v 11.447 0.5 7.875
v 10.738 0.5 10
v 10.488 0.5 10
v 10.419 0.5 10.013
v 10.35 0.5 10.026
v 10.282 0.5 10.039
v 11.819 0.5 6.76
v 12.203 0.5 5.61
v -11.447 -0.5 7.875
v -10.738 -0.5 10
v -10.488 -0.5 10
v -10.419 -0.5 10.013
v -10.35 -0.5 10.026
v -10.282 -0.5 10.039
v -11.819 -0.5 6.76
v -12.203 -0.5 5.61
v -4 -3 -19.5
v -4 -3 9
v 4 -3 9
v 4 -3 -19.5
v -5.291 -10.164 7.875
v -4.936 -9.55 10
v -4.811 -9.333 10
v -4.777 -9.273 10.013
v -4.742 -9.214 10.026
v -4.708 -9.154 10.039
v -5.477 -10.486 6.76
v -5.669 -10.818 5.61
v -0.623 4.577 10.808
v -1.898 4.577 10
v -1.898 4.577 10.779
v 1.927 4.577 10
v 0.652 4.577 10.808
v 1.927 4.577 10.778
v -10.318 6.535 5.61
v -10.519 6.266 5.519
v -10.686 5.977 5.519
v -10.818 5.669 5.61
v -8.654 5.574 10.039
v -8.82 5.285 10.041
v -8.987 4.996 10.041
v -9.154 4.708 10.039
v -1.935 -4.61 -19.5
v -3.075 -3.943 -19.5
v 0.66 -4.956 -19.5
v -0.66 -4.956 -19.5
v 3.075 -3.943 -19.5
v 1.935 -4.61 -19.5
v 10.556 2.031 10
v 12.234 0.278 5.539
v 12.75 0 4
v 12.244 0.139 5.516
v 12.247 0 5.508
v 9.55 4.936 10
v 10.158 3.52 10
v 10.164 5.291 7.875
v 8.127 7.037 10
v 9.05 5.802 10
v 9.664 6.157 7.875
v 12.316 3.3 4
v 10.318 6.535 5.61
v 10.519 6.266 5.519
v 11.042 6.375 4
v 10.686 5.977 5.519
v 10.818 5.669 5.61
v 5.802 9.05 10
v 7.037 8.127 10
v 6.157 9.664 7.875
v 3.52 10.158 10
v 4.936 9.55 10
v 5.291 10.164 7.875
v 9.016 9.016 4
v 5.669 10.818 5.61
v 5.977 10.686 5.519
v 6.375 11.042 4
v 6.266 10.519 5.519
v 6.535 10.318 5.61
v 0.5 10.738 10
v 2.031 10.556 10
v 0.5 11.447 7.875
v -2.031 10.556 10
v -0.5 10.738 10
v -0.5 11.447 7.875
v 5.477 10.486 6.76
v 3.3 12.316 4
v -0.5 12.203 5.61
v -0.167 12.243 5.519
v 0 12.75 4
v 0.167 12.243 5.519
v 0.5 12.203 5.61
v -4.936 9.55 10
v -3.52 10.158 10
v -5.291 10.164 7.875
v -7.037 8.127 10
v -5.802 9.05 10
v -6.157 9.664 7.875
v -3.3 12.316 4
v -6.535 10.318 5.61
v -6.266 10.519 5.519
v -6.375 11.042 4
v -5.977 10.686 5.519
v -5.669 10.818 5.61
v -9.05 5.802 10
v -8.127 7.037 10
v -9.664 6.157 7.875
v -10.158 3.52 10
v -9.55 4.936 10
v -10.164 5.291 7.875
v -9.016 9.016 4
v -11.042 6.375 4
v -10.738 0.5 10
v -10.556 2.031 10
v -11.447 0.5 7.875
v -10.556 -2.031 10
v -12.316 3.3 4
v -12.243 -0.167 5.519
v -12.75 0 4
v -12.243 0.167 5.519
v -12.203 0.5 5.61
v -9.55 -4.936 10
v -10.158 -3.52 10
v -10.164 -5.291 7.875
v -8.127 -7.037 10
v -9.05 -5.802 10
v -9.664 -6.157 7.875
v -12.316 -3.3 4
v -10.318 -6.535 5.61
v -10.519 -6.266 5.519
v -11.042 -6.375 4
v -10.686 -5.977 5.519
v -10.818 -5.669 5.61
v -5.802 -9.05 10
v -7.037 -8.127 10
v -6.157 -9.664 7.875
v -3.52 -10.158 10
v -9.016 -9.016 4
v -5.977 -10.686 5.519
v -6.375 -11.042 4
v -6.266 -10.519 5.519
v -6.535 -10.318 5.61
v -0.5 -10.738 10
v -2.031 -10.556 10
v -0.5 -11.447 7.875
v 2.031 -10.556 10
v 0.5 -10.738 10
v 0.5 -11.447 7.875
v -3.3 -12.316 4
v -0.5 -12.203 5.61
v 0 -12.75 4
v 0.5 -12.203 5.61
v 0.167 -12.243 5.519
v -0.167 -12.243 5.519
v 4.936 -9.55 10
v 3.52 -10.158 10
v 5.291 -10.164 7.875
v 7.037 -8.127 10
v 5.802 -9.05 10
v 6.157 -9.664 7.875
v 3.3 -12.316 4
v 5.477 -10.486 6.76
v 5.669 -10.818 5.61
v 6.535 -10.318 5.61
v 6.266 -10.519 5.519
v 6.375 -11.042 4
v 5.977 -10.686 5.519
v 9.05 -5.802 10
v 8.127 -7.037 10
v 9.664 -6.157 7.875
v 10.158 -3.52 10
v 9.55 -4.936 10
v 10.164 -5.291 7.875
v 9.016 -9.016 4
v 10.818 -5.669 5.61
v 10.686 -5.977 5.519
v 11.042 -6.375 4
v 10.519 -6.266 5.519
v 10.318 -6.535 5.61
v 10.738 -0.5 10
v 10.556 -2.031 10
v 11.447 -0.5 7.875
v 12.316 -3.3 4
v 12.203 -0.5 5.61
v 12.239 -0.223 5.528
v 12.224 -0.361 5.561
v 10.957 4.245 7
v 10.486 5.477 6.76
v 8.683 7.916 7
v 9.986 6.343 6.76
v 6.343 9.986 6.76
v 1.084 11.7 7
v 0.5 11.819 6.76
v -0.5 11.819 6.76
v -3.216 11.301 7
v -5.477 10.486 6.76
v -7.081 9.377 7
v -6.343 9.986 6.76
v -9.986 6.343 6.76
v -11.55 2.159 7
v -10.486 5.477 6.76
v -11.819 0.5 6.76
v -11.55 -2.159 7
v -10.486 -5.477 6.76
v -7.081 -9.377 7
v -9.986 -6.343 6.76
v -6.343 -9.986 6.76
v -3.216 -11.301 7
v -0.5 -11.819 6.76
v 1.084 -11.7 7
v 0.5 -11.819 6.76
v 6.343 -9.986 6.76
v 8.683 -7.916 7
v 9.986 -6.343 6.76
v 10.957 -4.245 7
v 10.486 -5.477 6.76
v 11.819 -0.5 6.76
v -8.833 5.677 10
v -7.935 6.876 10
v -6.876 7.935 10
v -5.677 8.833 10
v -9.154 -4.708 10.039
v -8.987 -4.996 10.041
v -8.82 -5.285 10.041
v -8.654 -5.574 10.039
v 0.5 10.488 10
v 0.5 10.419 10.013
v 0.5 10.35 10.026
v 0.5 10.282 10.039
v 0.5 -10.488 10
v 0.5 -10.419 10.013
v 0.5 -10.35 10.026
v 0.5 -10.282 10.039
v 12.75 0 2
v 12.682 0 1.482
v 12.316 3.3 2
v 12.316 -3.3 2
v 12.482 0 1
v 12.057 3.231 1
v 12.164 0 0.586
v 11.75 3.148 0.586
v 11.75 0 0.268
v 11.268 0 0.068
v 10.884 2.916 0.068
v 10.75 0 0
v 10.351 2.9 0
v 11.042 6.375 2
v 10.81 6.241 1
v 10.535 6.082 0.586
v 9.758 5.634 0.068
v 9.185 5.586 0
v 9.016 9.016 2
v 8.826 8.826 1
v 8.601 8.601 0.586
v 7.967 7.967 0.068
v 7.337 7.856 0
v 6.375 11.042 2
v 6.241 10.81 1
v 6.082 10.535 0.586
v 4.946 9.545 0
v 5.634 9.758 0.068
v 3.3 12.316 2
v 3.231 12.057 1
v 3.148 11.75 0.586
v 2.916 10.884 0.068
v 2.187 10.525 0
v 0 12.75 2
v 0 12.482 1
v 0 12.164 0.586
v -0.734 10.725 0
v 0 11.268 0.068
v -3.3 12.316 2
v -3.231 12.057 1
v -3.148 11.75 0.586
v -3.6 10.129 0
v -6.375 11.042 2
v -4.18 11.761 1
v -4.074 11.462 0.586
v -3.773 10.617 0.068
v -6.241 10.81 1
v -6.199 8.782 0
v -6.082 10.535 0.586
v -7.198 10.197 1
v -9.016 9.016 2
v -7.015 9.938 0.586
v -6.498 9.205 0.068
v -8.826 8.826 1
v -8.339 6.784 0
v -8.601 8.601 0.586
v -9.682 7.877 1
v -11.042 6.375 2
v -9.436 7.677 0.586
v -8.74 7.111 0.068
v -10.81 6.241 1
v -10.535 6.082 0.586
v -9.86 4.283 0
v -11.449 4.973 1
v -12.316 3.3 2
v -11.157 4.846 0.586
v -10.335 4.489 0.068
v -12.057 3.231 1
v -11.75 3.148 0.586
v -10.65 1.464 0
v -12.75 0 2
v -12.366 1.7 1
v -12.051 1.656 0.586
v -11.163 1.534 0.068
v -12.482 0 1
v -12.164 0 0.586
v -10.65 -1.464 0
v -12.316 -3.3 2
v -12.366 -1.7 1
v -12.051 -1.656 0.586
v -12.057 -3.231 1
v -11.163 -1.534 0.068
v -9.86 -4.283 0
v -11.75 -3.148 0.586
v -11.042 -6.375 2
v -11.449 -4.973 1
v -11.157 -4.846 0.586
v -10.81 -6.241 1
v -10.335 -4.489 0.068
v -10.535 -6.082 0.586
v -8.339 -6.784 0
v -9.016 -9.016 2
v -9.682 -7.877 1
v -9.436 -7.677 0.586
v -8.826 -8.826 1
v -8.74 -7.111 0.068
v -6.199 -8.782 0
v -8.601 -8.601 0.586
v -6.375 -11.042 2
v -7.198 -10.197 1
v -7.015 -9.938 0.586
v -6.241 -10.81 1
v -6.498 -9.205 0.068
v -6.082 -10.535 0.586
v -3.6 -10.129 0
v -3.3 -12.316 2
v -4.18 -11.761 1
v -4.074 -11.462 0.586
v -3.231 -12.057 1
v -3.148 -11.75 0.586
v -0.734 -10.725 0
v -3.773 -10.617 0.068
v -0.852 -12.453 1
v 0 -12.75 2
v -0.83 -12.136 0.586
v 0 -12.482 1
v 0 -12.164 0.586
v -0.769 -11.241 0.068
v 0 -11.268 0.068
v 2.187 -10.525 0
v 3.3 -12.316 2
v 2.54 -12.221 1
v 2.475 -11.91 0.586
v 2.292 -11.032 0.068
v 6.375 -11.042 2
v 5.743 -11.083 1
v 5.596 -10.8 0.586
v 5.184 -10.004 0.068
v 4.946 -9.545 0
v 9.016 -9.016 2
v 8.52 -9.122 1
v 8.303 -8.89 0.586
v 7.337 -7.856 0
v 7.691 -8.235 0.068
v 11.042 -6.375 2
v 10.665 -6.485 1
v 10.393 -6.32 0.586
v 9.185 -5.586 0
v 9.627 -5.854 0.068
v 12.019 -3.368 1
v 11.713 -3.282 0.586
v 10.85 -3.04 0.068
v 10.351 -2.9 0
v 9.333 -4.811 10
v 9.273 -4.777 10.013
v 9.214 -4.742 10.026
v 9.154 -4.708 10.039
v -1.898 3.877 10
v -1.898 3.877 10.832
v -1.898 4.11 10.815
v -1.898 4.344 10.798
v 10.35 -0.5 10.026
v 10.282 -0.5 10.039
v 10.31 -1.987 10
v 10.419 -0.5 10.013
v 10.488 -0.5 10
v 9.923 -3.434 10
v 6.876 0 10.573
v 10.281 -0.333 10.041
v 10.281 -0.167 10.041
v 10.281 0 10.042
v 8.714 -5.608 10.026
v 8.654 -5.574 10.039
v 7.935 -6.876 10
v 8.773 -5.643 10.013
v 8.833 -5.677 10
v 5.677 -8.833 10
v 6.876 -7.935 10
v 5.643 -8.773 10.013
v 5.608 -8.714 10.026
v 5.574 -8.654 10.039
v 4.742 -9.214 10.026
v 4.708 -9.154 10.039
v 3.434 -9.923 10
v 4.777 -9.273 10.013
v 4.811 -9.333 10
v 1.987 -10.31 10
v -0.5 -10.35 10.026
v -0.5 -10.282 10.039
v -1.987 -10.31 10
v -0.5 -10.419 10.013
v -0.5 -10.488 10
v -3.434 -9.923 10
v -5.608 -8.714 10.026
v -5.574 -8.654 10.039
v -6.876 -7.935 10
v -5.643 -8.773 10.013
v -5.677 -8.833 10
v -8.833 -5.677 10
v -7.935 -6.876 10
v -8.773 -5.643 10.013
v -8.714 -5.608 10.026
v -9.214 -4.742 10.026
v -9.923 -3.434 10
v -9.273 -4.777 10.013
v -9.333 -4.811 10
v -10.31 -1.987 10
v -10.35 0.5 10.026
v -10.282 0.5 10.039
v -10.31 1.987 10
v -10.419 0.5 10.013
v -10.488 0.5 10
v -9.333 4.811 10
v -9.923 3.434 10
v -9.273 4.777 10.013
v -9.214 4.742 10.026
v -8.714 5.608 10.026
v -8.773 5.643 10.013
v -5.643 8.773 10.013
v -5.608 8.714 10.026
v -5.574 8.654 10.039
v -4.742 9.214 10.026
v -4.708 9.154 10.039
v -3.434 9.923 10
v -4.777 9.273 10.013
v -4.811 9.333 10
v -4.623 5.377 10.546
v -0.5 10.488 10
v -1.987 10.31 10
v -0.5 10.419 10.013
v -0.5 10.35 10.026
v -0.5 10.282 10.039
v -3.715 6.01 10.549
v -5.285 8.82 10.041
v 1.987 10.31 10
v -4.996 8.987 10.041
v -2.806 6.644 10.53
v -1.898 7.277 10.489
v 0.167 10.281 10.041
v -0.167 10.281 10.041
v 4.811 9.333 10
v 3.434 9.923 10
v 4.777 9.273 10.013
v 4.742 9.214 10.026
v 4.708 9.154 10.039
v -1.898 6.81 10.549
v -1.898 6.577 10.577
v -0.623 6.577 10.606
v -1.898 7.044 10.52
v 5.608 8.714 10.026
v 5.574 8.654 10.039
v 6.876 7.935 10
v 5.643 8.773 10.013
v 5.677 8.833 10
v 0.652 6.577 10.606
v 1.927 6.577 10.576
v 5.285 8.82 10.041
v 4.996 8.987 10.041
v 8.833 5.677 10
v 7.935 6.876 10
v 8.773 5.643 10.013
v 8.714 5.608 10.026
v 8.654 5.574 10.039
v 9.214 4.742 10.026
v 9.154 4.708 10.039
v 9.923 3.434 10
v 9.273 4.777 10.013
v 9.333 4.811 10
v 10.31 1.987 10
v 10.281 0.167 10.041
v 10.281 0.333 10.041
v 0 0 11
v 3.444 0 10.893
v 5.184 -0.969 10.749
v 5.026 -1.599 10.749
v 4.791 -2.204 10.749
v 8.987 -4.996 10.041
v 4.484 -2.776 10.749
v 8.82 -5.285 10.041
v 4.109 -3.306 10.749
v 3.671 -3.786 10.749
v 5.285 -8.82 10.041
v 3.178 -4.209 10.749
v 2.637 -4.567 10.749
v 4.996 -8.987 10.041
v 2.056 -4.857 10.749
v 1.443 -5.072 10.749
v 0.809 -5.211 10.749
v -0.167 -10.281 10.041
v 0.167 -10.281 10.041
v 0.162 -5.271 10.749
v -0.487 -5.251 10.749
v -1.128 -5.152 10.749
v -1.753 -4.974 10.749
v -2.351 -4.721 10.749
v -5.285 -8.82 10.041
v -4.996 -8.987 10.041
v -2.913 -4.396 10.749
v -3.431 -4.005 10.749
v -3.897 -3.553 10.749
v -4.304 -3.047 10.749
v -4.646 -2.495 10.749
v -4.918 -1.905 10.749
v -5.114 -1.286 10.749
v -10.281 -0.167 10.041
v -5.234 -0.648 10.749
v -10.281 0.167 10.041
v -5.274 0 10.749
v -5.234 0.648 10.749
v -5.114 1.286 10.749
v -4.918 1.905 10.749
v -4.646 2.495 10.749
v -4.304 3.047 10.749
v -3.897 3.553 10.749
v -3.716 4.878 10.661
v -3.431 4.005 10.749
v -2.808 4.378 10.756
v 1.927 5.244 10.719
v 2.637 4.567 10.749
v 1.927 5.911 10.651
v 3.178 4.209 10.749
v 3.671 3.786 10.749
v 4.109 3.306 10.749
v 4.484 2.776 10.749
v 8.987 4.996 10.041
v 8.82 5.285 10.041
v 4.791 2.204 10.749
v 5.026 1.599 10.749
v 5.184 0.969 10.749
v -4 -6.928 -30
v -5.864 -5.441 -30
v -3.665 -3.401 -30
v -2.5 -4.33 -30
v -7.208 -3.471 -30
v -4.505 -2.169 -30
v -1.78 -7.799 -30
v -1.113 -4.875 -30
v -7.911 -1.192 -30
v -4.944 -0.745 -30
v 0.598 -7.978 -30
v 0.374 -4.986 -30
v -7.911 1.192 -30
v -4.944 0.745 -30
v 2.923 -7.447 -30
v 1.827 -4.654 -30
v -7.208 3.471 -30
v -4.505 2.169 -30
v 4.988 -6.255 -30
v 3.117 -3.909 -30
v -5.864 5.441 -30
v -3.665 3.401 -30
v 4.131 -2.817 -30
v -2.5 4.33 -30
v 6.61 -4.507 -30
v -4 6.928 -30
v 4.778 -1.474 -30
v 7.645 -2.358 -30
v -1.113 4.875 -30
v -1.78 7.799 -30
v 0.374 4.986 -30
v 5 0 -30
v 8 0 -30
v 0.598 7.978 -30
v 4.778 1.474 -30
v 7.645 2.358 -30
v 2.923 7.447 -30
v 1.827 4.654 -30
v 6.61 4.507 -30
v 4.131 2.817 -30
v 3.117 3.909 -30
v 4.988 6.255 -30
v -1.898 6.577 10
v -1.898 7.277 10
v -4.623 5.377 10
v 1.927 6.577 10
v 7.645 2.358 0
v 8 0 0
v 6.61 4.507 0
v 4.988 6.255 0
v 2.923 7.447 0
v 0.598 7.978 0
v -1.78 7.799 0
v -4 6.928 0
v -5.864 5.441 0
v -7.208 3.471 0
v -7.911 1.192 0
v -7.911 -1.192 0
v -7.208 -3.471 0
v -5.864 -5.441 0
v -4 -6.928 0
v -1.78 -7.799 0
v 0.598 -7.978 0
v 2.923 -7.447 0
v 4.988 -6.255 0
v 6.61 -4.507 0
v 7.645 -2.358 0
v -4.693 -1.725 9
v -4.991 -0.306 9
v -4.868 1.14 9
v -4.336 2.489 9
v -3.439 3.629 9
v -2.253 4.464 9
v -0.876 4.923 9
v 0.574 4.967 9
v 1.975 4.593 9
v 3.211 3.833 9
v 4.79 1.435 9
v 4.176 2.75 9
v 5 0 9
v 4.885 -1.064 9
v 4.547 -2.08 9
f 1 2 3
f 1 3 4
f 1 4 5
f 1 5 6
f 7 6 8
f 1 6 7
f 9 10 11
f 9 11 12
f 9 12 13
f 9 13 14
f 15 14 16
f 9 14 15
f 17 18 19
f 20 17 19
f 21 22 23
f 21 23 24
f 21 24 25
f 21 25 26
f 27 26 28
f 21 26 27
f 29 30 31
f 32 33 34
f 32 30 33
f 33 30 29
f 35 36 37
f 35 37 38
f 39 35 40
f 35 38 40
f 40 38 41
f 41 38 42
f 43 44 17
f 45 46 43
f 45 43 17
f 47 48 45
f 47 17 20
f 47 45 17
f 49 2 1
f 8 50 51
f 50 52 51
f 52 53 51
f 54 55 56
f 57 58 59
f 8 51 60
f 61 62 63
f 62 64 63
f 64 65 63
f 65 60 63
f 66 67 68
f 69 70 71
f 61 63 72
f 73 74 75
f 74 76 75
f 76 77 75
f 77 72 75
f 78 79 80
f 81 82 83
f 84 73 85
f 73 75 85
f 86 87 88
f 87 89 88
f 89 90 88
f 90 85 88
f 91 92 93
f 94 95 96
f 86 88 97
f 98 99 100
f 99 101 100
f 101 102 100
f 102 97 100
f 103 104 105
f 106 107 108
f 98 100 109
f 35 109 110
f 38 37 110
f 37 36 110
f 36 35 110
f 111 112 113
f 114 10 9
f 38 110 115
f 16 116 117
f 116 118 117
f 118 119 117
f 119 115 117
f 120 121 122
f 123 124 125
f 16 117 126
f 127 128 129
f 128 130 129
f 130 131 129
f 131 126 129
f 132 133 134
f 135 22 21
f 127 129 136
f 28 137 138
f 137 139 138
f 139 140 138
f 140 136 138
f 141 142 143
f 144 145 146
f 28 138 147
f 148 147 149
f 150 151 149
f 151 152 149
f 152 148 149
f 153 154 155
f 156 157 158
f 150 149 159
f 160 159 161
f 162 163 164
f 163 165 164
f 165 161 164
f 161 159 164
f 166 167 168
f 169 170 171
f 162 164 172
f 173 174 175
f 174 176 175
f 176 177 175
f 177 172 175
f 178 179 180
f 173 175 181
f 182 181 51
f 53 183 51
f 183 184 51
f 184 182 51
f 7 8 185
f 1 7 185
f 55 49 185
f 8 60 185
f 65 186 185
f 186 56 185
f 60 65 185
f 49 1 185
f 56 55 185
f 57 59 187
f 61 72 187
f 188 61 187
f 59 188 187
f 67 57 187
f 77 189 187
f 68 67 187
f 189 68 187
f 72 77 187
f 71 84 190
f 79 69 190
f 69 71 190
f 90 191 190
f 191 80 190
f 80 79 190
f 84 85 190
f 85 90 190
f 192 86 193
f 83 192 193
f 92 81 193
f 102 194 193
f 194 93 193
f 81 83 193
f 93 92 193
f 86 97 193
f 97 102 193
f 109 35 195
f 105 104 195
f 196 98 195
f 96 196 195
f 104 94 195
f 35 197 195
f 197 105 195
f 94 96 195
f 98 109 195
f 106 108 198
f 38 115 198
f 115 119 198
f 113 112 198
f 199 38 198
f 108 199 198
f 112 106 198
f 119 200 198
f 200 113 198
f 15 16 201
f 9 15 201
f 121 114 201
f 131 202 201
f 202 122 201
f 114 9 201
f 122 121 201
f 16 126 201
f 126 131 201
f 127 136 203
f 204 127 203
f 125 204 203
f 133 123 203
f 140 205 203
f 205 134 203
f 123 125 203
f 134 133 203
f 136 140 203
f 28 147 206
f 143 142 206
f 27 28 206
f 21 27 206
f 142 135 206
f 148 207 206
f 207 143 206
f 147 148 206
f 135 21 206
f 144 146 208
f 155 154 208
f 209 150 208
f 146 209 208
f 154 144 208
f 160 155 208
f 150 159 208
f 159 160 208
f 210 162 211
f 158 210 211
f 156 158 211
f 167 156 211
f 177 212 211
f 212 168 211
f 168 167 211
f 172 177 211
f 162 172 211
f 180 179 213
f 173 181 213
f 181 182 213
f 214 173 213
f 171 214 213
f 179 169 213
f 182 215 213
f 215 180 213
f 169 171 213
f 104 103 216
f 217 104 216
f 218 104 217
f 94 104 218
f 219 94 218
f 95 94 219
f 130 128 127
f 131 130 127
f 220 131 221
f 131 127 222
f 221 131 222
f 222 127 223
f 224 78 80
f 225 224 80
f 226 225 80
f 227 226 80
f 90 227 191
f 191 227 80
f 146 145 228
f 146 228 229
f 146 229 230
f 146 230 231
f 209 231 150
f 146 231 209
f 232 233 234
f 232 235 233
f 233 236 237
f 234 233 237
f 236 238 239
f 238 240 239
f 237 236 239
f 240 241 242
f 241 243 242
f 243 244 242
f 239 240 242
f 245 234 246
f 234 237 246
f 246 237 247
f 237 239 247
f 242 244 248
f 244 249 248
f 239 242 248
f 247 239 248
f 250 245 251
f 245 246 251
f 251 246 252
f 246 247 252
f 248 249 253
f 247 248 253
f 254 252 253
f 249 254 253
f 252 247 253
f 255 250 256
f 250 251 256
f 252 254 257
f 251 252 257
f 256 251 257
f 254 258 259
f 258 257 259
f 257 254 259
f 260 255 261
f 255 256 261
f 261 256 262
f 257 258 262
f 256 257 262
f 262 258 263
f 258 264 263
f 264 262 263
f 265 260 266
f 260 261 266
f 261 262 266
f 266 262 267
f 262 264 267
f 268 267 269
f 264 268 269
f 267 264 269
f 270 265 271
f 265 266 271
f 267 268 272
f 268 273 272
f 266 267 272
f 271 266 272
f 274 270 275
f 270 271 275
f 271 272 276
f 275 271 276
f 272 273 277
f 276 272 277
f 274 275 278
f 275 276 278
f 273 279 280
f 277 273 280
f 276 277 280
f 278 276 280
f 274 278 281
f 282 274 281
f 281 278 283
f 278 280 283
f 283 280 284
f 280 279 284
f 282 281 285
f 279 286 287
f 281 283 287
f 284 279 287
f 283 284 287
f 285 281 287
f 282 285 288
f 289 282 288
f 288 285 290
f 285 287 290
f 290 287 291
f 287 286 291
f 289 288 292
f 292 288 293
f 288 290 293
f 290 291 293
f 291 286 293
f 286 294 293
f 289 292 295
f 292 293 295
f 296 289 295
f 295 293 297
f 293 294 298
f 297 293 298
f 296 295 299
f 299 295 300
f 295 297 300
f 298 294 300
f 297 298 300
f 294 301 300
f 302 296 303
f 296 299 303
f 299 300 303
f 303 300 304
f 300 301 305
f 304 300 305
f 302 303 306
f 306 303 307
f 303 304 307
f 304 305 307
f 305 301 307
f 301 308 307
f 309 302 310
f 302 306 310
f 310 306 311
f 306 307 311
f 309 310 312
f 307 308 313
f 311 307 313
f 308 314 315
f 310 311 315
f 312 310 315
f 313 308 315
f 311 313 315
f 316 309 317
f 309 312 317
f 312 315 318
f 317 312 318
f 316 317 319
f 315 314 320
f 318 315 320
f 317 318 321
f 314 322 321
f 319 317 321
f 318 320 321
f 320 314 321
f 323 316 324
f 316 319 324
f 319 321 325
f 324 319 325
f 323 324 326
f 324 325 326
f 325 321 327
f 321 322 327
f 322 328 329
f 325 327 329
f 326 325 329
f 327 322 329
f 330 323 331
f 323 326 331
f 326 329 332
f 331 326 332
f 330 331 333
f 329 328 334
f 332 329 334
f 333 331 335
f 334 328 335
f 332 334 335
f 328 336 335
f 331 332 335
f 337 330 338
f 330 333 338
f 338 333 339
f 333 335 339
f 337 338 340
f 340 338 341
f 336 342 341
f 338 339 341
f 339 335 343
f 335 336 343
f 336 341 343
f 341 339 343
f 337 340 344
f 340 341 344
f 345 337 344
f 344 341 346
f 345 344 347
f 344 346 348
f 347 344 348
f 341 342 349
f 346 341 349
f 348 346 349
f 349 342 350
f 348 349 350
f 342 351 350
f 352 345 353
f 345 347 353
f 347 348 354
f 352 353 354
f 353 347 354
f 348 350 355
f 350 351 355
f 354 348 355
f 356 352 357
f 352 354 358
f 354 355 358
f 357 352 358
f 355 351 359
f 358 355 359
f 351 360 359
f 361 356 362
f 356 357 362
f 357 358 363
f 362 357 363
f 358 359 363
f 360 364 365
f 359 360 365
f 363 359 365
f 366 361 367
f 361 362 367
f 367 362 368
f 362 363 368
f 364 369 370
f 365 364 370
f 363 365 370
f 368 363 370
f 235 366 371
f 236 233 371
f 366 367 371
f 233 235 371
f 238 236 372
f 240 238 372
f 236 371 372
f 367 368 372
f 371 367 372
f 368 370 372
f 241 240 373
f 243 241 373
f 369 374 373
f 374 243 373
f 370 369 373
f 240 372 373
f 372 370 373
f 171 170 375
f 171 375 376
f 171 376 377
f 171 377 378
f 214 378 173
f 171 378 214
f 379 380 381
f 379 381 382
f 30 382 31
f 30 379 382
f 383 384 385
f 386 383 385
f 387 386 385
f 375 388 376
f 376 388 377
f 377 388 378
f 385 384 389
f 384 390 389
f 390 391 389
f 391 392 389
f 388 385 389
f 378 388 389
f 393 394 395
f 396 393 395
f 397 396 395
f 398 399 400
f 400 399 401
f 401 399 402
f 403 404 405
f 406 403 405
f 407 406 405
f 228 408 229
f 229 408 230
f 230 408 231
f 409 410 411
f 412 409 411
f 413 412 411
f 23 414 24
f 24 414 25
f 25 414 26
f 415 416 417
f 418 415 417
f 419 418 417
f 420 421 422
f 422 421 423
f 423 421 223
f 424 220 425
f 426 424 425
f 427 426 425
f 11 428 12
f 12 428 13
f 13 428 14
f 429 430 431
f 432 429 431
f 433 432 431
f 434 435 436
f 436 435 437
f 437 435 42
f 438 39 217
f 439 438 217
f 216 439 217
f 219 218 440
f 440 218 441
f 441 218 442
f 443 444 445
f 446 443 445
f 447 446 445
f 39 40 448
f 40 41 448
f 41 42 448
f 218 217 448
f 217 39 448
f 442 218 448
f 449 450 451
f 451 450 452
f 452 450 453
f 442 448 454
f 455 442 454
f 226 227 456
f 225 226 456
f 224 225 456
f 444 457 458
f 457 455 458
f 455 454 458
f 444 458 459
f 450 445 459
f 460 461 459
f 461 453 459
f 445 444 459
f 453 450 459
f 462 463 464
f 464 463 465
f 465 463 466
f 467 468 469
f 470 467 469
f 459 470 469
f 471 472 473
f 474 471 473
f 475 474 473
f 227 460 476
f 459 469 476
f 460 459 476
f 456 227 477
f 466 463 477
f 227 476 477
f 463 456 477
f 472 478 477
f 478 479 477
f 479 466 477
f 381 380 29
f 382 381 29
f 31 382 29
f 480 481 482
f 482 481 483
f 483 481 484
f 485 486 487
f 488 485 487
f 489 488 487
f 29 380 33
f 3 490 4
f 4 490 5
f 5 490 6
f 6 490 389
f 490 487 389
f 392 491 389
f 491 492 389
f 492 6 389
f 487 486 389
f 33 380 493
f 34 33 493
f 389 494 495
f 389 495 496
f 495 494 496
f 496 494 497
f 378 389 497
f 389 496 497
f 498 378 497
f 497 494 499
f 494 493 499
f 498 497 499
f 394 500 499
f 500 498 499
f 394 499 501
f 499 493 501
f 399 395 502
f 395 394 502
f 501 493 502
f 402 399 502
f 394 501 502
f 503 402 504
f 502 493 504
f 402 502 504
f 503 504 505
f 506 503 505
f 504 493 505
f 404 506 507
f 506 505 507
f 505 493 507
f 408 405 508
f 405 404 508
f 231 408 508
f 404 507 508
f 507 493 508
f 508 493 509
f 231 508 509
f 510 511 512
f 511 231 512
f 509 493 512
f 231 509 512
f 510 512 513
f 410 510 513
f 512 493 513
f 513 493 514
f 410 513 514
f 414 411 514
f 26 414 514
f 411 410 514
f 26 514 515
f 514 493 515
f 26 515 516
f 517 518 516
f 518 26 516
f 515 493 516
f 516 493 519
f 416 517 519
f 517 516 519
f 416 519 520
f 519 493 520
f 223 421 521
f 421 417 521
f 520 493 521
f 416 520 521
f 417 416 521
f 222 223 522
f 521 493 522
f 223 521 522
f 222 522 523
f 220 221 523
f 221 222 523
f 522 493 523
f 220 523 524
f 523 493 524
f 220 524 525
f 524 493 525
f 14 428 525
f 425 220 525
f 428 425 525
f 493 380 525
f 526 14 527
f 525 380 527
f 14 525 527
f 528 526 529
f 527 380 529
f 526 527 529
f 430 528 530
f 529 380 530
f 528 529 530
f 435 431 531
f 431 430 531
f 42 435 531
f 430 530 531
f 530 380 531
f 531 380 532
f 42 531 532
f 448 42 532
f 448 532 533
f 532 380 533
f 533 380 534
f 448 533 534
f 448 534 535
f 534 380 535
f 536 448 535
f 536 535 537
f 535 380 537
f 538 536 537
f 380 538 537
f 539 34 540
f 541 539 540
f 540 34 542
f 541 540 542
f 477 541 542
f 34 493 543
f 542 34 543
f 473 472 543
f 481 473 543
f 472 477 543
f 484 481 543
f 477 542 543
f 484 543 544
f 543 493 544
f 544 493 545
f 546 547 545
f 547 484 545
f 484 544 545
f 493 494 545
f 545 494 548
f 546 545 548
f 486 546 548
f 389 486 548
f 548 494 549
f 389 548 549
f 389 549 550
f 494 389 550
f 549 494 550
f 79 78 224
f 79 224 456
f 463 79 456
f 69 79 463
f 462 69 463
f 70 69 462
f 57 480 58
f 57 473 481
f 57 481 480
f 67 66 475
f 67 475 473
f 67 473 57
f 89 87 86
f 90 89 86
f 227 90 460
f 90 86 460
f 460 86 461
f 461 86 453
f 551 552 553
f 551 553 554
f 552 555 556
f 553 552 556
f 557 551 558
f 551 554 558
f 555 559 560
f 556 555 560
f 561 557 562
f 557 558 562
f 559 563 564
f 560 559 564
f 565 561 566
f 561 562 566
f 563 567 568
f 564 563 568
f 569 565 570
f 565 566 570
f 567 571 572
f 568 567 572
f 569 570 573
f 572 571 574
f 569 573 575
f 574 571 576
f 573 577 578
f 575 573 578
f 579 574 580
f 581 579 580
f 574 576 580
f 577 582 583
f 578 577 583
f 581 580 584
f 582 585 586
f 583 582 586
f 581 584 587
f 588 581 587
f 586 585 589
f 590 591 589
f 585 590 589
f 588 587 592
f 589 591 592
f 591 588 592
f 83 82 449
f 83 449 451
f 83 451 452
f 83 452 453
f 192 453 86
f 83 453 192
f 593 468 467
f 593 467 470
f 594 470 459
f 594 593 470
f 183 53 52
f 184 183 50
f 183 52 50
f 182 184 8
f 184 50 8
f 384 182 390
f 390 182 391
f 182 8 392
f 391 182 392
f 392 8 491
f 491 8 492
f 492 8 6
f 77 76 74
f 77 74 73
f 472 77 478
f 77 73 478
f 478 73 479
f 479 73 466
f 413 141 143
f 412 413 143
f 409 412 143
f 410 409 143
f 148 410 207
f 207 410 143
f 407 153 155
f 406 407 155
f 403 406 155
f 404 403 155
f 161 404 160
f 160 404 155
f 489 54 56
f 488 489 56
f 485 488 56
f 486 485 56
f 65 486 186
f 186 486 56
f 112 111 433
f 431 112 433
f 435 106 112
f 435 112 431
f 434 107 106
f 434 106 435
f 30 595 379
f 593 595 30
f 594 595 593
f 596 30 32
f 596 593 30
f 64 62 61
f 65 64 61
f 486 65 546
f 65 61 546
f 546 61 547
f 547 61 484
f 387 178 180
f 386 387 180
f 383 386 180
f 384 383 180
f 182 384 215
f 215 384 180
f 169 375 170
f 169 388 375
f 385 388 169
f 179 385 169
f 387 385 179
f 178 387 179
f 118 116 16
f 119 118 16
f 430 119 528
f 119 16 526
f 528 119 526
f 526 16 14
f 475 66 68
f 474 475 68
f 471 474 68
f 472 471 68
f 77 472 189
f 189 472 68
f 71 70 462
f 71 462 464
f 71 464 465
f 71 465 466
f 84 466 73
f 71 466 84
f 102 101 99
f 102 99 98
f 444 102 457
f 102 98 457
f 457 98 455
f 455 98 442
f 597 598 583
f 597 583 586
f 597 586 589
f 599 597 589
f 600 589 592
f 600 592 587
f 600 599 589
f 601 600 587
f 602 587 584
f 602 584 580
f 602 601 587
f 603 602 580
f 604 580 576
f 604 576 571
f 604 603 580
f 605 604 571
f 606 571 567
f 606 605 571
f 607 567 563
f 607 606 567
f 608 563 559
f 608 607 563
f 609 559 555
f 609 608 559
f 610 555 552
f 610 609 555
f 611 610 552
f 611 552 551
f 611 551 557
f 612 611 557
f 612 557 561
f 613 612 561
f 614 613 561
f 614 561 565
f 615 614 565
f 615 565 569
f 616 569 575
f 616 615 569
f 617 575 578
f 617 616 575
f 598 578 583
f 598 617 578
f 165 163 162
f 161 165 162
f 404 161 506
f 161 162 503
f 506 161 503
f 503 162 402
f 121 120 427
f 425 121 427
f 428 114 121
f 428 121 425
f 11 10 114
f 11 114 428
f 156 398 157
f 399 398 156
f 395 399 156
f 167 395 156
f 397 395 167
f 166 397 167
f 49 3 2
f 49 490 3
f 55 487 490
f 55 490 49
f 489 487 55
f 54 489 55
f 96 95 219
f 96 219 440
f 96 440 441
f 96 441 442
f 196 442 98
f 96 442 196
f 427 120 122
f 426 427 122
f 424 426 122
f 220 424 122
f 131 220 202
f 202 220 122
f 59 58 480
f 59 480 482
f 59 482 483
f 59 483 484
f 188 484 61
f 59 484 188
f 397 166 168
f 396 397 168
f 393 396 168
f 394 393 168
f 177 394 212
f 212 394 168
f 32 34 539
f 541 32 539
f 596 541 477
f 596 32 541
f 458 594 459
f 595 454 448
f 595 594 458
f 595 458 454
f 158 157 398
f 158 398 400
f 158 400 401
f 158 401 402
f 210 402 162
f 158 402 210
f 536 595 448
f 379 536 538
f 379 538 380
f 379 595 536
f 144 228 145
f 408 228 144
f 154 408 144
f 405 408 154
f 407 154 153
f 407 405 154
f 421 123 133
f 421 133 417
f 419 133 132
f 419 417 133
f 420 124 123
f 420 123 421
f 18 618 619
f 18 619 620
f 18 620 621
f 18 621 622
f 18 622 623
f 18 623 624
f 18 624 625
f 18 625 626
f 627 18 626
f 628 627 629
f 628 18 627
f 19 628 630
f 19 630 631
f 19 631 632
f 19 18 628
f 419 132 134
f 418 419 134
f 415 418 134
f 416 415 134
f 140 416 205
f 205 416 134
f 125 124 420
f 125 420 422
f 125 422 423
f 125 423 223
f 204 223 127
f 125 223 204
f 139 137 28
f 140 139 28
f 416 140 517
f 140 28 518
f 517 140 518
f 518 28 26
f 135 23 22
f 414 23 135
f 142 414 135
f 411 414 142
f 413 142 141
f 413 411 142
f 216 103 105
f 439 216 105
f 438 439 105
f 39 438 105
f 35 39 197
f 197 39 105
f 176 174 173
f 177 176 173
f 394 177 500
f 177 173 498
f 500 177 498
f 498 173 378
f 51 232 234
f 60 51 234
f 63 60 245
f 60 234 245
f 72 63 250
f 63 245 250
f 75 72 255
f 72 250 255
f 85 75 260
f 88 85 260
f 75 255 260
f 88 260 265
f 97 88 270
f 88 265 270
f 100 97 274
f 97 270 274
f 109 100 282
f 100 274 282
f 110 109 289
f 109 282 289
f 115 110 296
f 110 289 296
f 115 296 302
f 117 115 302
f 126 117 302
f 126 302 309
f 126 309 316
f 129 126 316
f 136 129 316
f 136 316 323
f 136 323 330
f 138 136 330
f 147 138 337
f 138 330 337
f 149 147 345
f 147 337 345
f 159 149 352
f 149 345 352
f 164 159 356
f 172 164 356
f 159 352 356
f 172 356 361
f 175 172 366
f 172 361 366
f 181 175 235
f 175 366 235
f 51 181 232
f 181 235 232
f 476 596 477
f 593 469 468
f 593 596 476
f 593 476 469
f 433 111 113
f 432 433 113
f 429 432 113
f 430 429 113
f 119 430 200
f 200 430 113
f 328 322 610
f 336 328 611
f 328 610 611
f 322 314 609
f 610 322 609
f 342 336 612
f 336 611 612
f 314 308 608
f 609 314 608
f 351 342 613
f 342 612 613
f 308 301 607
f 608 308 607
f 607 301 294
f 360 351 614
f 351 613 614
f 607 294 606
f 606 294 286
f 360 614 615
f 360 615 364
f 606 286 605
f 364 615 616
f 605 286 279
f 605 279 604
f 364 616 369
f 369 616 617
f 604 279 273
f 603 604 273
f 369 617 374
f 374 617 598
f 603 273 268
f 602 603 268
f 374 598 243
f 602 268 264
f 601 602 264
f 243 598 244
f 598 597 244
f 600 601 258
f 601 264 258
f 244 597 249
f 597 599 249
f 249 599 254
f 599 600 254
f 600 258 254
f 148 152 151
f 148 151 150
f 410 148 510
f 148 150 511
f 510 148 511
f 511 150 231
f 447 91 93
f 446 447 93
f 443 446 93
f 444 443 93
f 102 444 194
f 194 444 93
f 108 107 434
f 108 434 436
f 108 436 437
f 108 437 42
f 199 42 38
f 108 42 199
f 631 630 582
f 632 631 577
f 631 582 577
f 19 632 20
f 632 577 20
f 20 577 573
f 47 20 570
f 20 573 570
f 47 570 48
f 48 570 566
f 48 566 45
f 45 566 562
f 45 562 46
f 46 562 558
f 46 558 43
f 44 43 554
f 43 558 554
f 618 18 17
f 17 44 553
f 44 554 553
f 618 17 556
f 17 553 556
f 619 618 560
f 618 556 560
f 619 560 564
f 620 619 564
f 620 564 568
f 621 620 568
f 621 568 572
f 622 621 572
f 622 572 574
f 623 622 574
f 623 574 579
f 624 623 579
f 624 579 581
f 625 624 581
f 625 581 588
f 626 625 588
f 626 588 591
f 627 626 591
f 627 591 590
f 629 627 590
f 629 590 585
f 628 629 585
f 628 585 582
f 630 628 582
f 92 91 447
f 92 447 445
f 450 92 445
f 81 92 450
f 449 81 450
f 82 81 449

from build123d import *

# Parameters (mm, degrees)
F0_R             = 8
F1_DEPTH         = 30
F2_R             = 12.75
F3_DEPTH         = 10
F4_SIZE2         = 6
F4_SIZE          = 2
F7_R             = 2
F8_R             = 5
F9_DEPTH         = 39
F11_DEPTH        = 28.5
F13_DEPTH        = 0.5
F13_COPIES_COUNT = 12
F15_DEPTH        = 1


# Not quite as in the source:
# - a pattern or mirror of a feature is missing from the dataset's text; its kind, count and spacing are read off the source's solid


with BuildPart() as f1:
    # F0 (on Top) → F1 (new body)
    with BuildSketch(Plane.XY):
        Circle(F0_R)
    extrude(amount=-F1_DEPTH)

    # F2 (on Top) → F3 (join)
    with BuildSketch(Plane.XY):
        Circle(F2_R)
    extrude(amount=F3_DEPTH)

    # F4
    f4_edges = [f1.edges().sort_by_distance(p)[0] for p in [
        (-12.75, 0, 10),
    ]]
    f4_side = f1.faces().sort_by_distance((0, 0, 10))[0]
    chamfer(f4_edges, length=F4_SIZE, length2=F4_SIZE2, reference=f4_side)

    # F5 (on Front) → F6 (revolve)
    with BuildSketch(Plane.XZ):
        with BuildLine():
            Line((0, 10), (10.5, 10))
            ThreePointArc((10.5, 10), (5.2737557774, 10.749435663), (0, 11))
            Line((0, 11), (0, 10))
        make_face()
    revolve(axis=Axis((0, 0, 11.4106573164), (0, 0, -1)))

    # F7
    f7_edges = [f1.edges().sort_by_distance(p)[0] for p in [
        (-12.75, 0, 0),
    ]]
    fillet(f7_edges, radius=F7_R)

    # F8 (on face) → F9 (cut)
    with BuildSketch(Plane(origin=(0, 0, -30), x_dir=(1, 0, 0), z_dir=(0, 0, -1))):
        Circle(F8_R)
    extrude(amount=-F9_DEPTH, mode=Mode.SUBTRACT)

    # F10 (on face) → F11 (join)
    with BuildSketch(Plane(origin=(0, 0, 9), x_dir=(1, 0, 0), z_dir=(0, 0, -1))):
        Polygon((0, 6), (-4.867254519, 3), (5.0389095293, 3), align=None)
    extrude(amount=F11_DEPTH)

    # F12 (on Front) → F13 (cut, symmetric)
    with BuildSketch(Plane.XZ):
        Polygon((-13.3409490809, 2.9869333375), (-9.9859265611, 10.7209142298), (-13.1098602818, 12.8878117818), (-16.7612417104, 4.4706658365), align=None)
    f13 = extrude(amount=F13_DEPTH, both=True, mode=Mode.SUBTRACT)

    # F13_copies: F13 ×12 about axis
    f13_copies_axis = Axis((0, 0, 0), (0, 0, 1))
    for i in range(1, F13_COPIES_COUNT):
        add(f13.rotate(f13_copies_axis, i * 360 / F13_COPIES_COUNT), mode=Mode.SUBTRACT)

    # F14 (on face) → F15 (cut)
    with BuildSketch(Plane.XY.offset(10)):
        Polygon((1.9268689083, 4.5769295732), (1.9268689083, 6.5769295732), (-1.8981318941, 6.5769295732), (-1.8981318941, 7.2769295732), (-4.6231322793, 5.3769295732), (-1.8981318941, 3.8769295732), (-1.8981318941, 4.5769295732), align=None)
    extrude(amount=F15_DEPTH, mode=Mode.SUBTRACT)


solid = f1.part
